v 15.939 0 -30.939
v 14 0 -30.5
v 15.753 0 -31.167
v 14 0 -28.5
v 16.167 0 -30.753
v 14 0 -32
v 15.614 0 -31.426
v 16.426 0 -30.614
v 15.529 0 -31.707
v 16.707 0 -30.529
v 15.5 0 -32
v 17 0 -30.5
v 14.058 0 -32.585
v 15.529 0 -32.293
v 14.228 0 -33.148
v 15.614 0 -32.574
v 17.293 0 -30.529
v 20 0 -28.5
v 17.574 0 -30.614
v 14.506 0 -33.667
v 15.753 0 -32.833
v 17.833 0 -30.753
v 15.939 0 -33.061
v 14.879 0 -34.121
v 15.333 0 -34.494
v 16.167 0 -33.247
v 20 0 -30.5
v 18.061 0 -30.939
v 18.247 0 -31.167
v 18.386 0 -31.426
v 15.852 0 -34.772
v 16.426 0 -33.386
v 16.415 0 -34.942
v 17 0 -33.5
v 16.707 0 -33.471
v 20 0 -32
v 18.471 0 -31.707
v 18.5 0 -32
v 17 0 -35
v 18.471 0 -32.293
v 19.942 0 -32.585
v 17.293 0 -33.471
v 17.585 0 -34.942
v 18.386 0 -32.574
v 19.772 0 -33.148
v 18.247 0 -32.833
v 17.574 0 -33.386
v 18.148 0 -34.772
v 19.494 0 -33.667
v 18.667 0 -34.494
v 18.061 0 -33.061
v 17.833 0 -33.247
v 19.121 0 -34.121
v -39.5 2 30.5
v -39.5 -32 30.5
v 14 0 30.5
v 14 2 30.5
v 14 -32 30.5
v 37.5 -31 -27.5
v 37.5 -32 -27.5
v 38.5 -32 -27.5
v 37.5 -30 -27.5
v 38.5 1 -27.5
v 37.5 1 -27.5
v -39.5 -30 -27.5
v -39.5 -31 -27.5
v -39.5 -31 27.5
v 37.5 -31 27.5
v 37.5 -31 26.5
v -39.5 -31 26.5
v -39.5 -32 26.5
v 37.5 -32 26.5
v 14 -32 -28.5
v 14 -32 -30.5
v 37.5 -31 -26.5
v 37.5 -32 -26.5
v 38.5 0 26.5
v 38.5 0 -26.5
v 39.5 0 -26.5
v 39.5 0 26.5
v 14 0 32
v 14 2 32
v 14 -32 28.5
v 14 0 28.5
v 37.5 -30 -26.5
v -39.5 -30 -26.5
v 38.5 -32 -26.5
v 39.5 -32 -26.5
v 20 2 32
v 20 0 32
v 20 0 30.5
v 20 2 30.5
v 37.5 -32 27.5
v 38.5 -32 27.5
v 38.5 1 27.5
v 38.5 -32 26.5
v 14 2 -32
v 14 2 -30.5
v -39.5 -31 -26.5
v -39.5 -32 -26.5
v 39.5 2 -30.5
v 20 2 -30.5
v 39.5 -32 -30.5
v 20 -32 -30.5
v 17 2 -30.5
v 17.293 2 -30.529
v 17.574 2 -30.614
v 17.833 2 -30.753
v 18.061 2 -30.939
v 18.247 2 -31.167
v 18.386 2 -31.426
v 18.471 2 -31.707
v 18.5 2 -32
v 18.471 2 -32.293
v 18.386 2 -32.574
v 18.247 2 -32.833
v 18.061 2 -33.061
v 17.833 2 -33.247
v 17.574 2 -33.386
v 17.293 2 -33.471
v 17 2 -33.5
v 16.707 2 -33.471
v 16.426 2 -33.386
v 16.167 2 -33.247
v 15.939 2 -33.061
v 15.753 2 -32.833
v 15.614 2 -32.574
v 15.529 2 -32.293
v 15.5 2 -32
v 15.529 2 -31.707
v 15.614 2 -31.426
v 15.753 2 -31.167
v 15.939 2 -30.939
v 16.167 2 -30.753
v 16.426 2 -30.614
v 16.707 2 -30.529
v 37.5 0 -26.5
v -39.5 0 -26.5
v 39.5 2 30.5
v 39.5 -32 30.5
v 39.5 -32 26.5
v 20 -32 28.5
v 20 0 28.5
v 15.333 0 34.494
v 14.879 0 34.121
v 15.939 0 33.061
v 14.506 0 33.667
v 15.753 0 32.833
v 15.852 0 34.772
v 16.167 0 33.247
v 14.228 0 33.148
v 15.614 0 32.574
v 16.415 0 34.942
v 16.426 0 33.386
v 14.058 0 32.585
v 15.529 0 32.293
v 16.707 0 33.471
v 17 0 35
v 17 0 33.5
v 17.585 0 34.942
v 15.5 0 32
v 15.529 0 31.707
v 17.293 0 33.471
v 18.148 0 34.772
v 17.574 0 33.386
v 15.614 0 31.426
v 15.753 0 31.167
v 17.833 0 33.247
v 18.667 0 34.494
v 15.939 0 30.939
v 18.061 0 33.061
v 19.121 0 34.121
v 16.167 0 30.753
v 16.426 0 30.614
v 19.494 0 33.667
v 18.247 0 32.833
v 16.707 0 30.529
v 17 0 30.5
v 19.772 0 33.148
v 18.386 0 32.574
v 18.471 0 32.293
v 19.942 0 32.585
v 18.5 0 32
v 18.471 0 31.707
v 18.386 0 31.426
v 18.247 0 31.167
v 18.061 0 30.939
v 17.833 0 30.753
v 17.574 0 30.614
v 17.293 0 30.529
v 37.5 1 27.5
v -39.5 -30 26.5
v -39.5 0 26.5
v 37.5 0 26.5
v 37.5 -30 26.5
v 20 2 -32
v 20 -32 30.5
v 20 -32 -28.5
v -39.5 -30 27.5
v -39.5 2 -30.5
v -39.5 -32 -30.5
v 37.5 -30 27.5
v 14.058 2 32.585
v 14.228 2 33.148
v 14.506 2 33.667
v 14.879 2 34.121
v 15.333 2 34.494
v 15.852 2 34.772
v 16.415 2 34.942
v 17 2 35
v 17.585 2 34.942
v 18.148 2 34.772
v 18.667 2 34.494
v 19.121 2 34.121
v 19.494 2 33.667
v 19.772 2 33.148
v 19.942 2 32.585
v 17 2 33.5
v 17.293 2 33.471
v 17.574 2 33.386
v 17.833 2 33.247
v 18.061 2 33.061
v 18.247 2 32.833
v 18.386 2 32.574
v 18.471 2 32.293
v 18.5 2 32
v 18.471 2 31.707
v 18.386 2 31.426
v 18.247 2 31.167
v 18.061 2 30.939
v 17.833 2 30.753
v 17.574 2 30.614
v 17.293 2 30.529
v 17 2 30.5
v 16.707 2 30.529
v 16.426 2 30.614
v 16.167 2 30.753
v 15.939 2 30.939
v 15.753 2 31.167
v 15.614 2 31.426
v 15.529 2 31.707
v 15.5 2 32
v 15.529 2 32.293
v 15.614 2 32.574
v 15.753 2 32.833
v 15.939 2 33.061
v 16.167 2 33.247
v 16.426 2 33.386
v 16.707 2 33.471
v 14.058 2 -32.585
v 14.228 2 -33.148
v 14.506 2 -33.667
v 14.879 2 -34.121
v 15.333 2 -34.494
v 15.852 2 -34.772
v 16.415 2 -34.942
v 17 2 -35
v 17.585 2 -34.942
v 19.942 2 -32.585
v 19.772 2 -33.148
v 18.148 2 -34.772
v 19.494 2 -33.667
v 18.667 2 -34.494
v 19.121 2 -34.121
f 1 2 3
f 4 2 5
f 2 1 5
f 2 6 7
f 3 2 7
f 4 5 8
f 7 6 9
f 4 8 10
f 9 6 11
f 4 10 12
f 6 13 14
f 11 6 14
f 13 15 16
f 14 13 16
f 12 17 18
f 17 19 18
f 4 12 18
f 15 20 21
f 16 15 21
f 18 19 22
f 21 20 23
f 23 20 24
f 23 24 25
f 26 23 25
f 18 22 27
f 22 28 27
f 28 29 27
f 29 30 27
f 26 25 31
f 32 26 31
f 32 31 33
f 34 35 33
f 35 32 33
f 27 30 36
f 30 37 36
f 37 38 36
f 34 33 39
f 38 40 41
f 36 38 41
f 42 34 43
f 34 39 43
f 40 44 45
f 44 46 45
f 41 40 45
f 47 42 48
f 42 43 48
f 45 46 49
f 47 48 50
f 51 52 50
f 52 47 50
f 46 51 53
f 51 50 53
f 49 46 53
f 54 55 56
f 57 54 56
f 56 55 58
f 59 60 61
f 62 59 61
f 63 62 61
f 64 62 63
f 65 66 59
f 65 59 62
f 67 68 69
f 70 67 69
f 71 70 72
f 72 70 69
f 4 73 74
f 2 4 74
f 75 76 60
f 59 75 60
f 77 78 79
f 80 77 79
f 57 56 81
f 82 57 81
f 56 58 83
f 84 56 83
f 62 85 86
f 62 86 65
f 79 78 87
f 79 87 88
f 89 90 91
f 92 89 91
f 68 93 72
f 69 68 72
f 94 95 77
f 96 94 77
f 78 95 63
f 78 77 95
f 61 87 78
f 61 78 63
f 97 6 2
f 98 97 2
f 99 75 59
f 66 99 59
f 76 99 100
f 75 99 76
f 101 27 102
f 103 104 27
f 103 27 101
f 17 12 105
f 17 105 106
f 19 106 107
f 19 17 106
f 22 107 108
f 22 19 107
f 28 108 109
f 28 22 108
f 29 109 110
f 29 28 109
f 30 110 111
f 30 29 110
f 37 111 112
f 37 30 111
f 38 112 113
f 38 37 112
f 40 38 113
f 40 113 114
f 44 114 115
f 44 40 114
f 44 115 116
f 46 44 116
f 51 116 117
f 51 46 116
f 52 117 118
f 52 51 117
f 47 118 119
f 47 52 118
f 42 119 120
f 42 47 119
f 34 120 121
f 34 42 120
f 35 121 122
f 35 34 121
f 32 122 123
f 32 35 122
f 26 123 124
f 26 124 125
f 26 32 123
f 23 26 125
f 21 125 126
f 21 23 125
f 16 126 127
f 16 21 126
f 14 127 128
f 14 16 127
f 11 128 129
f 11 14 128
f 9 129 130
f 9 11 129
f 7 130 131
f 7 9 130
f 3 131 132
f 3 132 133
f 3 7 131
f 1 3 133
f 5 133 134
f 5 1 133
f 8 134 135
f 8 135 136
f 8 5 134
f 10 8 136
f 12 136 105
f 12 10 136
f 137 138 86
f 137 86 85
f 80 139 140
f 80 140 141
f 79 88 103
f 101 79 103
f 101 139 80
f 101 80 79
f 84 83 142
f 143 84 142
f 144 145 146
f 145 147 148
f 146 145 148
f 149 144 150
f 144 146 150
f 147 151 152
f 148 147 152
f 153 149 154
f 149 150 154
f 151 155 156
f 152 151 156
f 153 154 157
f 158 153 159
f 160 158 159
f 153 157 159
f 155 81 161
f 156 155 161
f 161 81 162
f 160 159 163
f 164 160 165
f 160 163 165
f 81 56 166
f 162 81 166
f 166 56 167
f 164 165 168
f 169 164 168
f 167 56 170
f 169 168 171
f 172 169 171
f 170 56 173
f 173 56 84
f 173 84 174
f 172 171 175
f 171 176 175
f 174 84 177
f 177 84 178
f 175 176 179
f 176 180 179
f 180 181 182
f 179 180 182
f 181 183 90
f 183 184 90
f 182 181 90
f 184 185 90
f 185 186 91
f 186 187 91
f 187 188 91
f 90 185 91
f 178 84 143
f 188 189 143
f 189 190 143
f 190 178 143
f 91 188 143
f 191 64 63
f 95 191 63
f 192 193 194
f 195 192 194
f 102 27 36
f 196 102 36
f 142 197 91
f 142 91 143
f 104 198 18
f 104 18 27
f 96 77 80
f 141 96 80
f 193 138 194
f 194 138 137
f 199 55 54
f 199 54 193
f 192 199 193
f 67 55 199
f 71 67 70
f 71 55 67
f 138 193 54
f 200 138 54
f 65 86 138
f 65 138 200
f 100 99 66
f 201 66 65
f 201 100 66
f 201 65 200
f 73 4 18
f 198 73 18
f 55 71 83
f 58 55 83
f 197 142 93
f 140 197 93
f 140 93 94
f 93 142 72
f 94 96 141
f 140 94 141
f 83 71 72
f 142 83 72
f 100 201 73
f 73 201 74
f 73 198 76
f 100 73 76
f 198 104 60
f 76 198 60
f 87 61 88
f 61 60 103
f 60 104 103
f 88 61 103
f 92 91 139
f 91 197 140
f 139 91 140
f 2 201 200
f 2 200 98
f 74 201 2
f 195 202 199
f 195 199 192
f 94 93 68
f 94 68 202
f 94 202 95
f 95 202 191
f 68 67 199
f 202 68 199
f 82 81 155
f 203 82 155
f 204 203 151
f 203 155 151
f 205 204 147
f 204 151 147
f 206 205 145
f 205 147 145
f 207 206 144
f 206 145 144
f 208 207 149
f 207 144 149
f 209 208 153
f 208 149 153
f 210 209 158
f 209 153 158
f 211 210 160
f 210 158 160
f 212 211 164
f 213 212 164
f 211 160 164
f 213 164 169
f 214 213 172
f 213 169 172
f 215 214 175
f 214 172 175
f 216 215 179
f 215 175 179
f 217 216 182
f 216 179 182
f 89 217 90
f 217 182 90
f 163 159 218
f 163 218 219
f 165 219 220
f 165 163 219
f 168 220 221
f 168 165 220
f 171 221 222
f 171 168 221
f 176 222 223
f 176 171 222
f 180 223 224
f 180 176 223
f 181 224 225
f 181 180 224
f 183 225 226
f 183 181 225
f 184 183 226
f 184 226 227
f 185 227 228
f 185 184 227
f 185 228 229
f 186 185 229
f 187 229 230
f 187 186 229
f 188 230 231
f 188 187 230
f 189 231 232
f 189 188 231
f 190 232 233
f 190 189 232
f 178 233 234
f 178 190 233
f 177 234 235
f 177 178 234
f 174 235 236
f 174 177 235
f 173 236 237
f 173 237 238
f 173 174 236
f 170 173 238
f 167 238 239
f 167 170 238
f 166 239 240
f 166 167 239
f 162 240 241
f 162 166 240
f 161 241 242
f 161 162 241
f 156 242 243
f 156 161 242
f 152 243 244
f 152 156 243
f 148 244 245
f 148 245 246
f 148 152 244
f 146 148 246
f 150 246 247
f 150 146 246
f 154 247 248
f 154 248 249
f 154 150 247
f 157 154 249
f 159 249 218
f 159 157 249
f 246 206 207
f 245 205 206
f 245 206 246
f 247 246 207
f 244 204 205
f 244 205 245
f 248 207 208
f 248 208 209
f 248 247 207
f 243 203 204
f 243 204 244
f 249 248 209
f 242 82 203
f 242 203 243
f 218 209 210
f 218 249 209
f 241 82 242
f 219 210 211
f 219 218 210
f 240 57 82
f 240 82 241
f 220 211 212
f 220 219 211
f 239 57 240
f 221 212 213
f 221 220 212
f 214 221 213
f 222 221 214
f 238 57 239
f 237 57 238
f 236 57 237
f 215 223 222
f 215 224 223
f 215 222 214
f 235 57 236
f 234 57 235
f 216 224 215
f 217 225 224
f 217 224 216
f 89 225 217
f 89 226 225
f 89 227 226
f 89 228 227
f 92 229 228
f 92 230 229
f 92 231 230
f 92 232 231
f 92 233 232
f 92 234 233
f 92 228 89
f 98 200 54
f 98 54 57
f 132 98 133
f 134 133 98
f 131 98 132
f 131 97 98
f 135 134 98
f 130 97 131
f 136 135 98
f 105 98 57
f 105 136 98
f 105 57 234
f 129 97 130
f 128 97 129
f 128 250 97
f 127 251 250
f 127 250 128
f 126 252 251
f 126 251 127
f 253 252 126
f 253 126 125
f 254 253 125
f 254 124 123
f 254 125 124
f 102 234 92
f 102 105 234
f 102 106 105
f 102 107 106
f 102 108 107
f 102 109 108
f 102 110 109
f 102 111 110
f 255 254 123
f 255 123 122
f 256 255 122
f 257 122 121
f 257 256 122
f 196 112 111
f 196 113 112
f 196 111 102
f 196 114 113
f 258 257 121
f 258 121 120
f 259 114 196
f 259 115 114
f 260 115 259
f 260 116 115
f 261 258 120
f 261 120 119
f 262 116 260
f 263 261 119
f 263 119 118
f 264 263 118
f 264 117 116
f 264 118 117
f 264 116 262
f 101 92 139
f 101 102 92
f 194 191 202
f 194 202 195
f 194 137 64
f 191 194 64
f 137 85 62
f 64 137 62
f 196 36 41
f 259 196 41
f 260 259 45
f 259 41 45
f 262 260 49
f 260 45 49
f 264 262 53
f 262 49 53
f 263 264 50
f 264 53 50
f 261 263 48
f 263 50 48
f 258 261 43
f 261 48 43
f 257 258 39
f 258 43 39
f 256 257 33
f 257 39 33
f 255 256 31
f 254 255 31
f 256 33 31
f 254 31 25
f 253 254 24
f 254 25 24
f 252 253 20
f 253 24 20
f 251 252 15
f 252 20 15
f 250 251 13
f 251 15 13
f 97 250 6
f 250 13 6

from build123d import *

# Parameters (mm, degrees)
SKETCH_1_W               = 79
SKETCH_1_H               = 57
SKETCH_1_W_2             = 71
SKETCH_1_H_2             = 49
SKETCH_1_R               = 1.5
EXTRUDE_1_DEPTH          = 2
SKETCH_2_W               = 79
SKETCH_2_H               = 2
EXTRUDE_2_DEPTH          = 32
CUT_EXTRUDE_1_DEPTH      = 1
CUT_EXTRUDE_1_DEPTH_BACK = 62.719121834
SKETCH_3_W               = 1
SKETCH_3_H               = 55
CUT_EXTRUDE_2_DEPTH      = 37.5
CUT_EXTRUDE_2_DEPTH_BACK = 62.719121834
SKETCH_4_W               = 1
SKETCH_4_H               = 1
EXTRUDE_3_DEPTH          = 2
EXTRUDE_3_DEPTH_BACK     = 32
SKETCH_5_W               = 53.5
SKETCH_5_H               = 2
SKETCH_5_W_2             = 19.5


with BuildPart() as part:
    # 草图1 → 凸台-拉伸1 (new body)
    # profile 1 of 4: a face of its own
    with BuildSketch(Plane(origin=(0, 0, 0), x_dir=(1, 0, 0), z_dir=(0, 1, 0))):
        Rectangle(SKETCH_1_W, SKETCH_1_H)
        Rectangle(SKETCH_1_W_2, SKETCH_1_H_2, mode=Mode.SUBTRACT)
    # profile 2 of 4: a face of its own
    with BuildSketch(Plane(origin=(0, 0, 0), x_dir=(1, 0, 0), z_dir=(0, 1, 0))):
        Rectangle(SKETCH_1_W_2, SKETCH_1_H_2)
    # profile 3 of 4: a face of its own
    with BuildSketch(Plane(origin=(0, 0, 0), x_dir=(1, 0, 0), z_dir=(0, 1, 0))):
        with BuildLine():
            Line((20, -28.5), (14, -28.5))
            Line((14, -28.5), (14, -32))
            ThreePointArc((14, -32), (17, -35), (20, -32))
            Line((20, -32), (20, -28.5))
        make_face()
        with Locations(Location((17, -32, 0), (0, 0, 270))):
            Circle(SKETCH_1_R, mode=Mode.SUBTRACT)
    # profile 4 of 4: a face of its own
    with BuildSketch(Plane(origin=(0, 0, 0), x_dir=(1, 0, 0), z_dir=(0, 1, 0))):
        with BuildLine():
            Line((14, 32), (14, 28.5))
            Line((14, 28.5), (20, 28.5))
            Line((20, 28.5), (20, 32))
            ThreePointArc((20, 32), (17, 35), (14, 32))
        make_face()
        with Locations(Location((17, 32, 0), (0, 0, 270))):
            Circle(SKETCH_1_R, mode=Mode.SUBTRACT)
    extrude(amount=EXTRUDE_1_DEPTH)

    # 草图2 → 凸台-拉伸2 (add)
    with BuildSketch(Plane(origin=(0, 0, 0), x_dir=(1, 0, 0), z_dir=(0, 1, 0))):
        with Locations((0, 27.5)):
            Rectangle(SKETCH_2_W, SKETCH_2_H)
        with Locations((0, -27.5)):
            Rectangle(SKETCH_2_W, SKETCH_2_H)
    extrude(amount=-EXTRUDE_2_DEPTH)

    # 草图3 → 切除-拉伸1 (cut, two sides: drawn at the far end of the back side and taken through both)
    with BuildSketch(Plane(origin=(0, 0, 0), x_dir=(1, 0, 0), z_dir=(0, 1, 0)).offset(-CUT_EXTRUDE_1_DEPTH_BACK)):
        with Locations((38, 0)):
            Rectangle(SKETCH_3_W, SKETCH_3_H)
    extrude(amount=CUT_EXTRUDE_1_DEPTH + CUT_EXTRUDE_1_DEPTH_BACK, mode=Mode.SUBTRACT)

    # 草图4 → 切除-拉伸2 (cut, two sides: drawn at the far end of the back side and taken through both)
    with BuildSketch(Plane(origin=(0, 0, 0), x_dir=(0, 0, -1), z_dir=(1, 0, 0)).offset(-CUT_EXTRUDE_2_DEPTH_BACK)):
        with Locations((-27, -30.5)):
            Rectangle(SKETCH_4_W, SKETCH_4_H)
        with Locations((27, -30.5)):
            Rectangle(SKETCH_4_W, SKETCH_4_H)
    extrude(amount=CUT_EXTRUDE_2_DEPTH + CUT_EXTRUDE_2_DEPTH_BACK, mode=Mode.SUBTRACT)

    # 草图5 → 凸台-拉伸3 (add, two sides: drawn at the far end of the back side and taken through both)
    with BuildSketch(Plane(origin=(0, 0, 0), x_dir=(1, 0, 0), z_dir=(0, 1, 0)).offset(-EXTRUDE_3_DEPTH_BACK)):
        with Locations((-12.75, 29.5)):
            Rectangle(SKETCH_5_W, SKETCH_5_H)
        with Locations((-12.75, -29.5)):
            Rectangle(SKETCH_5_W, SKETCH_5_H)
        with Locations((29.75, 29.5)):
            Rectangle(SKETCH_5_W_2, SKETCH_5_H)
        with Locations((29.75, -29.5)):
            Rectangle(SKETCH_5_W_2, SKETCH_5_H)
    extrude(amount=EXTRUDE_3_DEPTH + EXTRUDE_3_DEPTH_BACK)


solid = part.part
